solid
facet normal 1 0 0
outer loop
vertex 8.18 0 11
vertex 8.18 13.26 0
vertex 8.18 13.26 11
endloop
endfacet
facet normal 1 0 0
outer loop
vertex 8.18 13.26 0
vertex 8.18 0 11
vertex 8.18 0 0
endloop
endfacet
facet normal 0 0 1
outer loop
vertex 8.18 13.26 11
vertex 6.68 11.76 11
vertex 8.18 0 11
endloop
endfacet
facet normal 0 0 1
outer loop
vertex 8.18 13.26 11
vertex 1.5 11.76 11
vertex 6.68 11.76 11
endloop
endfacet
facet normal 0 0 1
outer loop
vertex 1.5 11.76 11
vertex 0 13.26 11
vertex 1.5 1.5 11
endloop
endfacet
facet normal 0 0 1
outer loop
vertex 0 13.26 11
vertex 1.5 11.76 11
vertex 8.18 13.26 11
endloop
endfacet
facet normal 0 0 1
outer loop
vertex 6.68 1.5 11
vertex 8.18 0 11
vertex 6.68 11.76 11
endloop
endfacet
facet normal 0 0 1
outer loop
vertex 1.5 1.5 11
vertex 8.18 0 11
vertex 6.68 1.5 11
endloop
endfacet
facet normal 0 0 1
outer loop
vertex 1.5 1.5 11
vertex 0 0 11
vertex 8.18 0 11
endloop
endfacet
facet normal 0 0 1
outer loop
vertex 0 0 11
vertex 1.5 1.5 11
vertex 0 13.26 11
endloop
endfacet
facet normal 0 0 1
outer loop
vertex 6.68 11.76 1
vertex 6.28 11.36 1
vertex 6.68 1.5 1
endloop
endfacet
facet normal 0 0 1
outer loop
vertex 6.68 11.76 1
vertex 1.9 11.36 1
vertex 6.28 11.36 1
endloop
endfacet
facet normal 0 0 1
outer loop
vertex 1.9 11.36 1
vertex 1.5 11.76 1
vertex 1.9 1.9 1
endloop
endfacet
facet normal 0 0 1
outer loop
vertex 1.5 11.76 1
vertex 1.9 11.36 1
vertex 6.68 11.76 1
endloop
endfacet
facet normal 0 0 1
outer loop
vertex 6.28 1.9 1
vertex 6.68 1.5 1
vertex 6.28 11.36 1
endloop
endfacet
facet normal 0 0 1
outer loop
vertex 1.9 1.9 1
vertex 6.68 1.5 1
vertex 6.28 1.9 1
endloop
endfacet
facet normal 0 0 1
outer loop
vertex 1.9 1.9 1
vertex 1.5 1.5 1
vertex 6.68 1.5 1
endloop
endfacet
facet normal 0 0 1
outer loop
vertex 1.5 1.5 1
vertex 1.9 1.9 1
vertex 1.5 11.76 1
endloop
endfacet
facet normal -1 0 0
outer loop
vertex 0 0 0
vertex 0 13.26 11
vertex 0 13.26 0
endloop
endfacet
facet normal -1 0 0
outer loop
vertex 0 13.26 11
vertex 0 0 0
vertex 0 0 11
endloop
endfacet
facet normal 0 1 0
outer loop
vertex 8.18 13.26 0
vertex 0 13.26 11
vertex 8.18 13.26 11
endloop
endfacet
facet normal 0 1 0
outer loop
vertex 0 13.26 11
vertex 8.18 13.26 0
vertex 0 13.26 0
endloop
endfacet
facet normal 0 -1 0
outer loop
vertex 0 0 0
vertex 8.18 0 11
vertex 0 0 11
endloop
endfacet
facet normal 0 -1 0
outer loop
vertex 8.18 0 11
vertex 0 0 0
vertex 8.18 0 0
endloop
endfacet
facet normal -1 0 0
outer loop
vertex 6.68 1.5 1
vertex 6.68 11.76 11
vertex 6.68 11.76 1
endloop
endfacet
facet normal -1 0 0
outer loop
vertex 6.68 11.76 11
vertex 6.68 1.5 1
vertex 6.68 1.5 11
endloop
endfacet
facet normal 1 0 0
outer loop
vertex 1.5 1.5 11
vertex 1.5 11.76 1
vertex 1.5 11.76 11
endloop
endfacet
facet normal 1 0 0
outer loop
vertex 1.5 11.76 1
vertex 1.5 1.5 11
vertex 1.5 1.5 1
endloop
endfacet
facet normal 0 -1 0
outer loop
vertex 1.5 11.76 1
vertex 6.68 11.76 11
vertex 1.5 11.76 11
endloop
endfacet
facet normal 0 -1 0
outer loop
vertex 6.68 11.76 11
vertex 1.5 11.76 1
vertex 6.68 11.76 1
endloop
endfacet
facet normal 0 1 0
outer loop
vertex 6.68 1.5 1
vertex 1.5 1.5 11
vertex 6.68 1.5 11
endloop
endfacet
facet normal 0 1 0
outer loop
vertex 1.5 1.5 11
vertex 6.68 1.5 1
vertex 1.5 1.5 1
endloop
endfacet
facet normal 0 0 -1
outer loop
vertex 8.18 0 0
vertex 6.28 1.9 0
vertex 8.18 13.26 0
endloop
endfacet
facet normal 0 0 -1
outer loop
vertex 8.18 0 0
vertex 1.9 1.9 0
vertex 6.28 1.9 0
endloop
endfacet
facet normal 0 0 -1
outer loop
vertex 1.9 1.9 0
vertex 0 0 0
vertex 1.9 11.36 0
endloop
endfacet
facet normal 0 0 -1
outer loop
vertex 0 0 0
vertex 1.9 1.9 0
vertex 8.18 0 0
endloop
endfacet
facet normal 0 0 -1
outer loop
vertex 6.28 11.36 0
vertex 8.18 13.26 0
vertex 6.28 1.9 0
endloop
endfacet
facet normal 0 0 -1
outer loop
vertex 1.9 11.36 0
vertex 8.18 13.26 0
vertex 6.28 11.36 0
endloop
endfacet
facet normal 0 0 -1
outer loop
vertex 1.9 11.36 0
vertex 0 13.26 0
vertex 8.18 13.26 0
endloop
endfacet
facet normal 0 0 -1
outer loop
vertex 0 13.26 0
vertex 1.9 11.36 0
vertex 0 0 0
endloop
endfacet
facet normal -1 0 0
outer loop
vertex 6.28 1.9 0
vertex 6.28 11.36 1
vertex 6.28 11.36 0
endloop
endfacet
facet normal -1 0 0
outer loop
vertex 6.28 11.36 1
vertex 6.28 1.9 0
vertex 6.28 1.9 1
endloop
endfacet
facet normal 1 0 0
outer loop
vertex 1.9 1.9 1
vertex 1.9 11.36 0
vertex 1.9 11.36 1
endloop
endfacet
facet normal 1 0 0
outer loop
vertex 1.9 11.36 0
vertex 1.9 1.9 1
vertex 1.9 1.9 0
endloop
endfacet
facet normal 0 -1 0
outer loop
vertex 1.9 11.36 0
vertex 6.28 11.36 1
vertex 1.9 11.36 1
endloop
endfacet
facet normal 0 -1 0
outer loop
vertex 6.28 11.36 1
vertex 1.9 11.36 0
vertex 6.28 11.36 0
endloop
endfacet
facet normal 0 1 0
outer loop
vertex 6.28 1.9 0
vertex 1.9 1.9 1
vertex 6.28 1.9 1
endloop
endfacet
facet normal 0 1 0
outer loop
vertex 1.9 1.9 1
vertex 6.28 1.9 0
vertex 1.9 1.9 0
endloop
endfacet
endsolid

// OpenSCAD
module esp_holder(){
thickness=1.5;
w=2*2.54+0.1;
d=4*2.54+0.1;
h=10;
translate([0,0,1])difference(){
  cube([w+2*thickness, d+2*thickness,h]);
  translate([thickness,thickness,0])cube([w,d,h]);
}
w2=w-0.8;
d2=d-0.8;
thickness2=thickness+0.4;
h2=1;
translate([0,0,0])difference(){
  cube([w2+2*thickness2, d2+2*thickness2,h2]);
  translate([thickness2,thickness2,0])cube([w2,d2,h2]);
}
}
esp_holder();
